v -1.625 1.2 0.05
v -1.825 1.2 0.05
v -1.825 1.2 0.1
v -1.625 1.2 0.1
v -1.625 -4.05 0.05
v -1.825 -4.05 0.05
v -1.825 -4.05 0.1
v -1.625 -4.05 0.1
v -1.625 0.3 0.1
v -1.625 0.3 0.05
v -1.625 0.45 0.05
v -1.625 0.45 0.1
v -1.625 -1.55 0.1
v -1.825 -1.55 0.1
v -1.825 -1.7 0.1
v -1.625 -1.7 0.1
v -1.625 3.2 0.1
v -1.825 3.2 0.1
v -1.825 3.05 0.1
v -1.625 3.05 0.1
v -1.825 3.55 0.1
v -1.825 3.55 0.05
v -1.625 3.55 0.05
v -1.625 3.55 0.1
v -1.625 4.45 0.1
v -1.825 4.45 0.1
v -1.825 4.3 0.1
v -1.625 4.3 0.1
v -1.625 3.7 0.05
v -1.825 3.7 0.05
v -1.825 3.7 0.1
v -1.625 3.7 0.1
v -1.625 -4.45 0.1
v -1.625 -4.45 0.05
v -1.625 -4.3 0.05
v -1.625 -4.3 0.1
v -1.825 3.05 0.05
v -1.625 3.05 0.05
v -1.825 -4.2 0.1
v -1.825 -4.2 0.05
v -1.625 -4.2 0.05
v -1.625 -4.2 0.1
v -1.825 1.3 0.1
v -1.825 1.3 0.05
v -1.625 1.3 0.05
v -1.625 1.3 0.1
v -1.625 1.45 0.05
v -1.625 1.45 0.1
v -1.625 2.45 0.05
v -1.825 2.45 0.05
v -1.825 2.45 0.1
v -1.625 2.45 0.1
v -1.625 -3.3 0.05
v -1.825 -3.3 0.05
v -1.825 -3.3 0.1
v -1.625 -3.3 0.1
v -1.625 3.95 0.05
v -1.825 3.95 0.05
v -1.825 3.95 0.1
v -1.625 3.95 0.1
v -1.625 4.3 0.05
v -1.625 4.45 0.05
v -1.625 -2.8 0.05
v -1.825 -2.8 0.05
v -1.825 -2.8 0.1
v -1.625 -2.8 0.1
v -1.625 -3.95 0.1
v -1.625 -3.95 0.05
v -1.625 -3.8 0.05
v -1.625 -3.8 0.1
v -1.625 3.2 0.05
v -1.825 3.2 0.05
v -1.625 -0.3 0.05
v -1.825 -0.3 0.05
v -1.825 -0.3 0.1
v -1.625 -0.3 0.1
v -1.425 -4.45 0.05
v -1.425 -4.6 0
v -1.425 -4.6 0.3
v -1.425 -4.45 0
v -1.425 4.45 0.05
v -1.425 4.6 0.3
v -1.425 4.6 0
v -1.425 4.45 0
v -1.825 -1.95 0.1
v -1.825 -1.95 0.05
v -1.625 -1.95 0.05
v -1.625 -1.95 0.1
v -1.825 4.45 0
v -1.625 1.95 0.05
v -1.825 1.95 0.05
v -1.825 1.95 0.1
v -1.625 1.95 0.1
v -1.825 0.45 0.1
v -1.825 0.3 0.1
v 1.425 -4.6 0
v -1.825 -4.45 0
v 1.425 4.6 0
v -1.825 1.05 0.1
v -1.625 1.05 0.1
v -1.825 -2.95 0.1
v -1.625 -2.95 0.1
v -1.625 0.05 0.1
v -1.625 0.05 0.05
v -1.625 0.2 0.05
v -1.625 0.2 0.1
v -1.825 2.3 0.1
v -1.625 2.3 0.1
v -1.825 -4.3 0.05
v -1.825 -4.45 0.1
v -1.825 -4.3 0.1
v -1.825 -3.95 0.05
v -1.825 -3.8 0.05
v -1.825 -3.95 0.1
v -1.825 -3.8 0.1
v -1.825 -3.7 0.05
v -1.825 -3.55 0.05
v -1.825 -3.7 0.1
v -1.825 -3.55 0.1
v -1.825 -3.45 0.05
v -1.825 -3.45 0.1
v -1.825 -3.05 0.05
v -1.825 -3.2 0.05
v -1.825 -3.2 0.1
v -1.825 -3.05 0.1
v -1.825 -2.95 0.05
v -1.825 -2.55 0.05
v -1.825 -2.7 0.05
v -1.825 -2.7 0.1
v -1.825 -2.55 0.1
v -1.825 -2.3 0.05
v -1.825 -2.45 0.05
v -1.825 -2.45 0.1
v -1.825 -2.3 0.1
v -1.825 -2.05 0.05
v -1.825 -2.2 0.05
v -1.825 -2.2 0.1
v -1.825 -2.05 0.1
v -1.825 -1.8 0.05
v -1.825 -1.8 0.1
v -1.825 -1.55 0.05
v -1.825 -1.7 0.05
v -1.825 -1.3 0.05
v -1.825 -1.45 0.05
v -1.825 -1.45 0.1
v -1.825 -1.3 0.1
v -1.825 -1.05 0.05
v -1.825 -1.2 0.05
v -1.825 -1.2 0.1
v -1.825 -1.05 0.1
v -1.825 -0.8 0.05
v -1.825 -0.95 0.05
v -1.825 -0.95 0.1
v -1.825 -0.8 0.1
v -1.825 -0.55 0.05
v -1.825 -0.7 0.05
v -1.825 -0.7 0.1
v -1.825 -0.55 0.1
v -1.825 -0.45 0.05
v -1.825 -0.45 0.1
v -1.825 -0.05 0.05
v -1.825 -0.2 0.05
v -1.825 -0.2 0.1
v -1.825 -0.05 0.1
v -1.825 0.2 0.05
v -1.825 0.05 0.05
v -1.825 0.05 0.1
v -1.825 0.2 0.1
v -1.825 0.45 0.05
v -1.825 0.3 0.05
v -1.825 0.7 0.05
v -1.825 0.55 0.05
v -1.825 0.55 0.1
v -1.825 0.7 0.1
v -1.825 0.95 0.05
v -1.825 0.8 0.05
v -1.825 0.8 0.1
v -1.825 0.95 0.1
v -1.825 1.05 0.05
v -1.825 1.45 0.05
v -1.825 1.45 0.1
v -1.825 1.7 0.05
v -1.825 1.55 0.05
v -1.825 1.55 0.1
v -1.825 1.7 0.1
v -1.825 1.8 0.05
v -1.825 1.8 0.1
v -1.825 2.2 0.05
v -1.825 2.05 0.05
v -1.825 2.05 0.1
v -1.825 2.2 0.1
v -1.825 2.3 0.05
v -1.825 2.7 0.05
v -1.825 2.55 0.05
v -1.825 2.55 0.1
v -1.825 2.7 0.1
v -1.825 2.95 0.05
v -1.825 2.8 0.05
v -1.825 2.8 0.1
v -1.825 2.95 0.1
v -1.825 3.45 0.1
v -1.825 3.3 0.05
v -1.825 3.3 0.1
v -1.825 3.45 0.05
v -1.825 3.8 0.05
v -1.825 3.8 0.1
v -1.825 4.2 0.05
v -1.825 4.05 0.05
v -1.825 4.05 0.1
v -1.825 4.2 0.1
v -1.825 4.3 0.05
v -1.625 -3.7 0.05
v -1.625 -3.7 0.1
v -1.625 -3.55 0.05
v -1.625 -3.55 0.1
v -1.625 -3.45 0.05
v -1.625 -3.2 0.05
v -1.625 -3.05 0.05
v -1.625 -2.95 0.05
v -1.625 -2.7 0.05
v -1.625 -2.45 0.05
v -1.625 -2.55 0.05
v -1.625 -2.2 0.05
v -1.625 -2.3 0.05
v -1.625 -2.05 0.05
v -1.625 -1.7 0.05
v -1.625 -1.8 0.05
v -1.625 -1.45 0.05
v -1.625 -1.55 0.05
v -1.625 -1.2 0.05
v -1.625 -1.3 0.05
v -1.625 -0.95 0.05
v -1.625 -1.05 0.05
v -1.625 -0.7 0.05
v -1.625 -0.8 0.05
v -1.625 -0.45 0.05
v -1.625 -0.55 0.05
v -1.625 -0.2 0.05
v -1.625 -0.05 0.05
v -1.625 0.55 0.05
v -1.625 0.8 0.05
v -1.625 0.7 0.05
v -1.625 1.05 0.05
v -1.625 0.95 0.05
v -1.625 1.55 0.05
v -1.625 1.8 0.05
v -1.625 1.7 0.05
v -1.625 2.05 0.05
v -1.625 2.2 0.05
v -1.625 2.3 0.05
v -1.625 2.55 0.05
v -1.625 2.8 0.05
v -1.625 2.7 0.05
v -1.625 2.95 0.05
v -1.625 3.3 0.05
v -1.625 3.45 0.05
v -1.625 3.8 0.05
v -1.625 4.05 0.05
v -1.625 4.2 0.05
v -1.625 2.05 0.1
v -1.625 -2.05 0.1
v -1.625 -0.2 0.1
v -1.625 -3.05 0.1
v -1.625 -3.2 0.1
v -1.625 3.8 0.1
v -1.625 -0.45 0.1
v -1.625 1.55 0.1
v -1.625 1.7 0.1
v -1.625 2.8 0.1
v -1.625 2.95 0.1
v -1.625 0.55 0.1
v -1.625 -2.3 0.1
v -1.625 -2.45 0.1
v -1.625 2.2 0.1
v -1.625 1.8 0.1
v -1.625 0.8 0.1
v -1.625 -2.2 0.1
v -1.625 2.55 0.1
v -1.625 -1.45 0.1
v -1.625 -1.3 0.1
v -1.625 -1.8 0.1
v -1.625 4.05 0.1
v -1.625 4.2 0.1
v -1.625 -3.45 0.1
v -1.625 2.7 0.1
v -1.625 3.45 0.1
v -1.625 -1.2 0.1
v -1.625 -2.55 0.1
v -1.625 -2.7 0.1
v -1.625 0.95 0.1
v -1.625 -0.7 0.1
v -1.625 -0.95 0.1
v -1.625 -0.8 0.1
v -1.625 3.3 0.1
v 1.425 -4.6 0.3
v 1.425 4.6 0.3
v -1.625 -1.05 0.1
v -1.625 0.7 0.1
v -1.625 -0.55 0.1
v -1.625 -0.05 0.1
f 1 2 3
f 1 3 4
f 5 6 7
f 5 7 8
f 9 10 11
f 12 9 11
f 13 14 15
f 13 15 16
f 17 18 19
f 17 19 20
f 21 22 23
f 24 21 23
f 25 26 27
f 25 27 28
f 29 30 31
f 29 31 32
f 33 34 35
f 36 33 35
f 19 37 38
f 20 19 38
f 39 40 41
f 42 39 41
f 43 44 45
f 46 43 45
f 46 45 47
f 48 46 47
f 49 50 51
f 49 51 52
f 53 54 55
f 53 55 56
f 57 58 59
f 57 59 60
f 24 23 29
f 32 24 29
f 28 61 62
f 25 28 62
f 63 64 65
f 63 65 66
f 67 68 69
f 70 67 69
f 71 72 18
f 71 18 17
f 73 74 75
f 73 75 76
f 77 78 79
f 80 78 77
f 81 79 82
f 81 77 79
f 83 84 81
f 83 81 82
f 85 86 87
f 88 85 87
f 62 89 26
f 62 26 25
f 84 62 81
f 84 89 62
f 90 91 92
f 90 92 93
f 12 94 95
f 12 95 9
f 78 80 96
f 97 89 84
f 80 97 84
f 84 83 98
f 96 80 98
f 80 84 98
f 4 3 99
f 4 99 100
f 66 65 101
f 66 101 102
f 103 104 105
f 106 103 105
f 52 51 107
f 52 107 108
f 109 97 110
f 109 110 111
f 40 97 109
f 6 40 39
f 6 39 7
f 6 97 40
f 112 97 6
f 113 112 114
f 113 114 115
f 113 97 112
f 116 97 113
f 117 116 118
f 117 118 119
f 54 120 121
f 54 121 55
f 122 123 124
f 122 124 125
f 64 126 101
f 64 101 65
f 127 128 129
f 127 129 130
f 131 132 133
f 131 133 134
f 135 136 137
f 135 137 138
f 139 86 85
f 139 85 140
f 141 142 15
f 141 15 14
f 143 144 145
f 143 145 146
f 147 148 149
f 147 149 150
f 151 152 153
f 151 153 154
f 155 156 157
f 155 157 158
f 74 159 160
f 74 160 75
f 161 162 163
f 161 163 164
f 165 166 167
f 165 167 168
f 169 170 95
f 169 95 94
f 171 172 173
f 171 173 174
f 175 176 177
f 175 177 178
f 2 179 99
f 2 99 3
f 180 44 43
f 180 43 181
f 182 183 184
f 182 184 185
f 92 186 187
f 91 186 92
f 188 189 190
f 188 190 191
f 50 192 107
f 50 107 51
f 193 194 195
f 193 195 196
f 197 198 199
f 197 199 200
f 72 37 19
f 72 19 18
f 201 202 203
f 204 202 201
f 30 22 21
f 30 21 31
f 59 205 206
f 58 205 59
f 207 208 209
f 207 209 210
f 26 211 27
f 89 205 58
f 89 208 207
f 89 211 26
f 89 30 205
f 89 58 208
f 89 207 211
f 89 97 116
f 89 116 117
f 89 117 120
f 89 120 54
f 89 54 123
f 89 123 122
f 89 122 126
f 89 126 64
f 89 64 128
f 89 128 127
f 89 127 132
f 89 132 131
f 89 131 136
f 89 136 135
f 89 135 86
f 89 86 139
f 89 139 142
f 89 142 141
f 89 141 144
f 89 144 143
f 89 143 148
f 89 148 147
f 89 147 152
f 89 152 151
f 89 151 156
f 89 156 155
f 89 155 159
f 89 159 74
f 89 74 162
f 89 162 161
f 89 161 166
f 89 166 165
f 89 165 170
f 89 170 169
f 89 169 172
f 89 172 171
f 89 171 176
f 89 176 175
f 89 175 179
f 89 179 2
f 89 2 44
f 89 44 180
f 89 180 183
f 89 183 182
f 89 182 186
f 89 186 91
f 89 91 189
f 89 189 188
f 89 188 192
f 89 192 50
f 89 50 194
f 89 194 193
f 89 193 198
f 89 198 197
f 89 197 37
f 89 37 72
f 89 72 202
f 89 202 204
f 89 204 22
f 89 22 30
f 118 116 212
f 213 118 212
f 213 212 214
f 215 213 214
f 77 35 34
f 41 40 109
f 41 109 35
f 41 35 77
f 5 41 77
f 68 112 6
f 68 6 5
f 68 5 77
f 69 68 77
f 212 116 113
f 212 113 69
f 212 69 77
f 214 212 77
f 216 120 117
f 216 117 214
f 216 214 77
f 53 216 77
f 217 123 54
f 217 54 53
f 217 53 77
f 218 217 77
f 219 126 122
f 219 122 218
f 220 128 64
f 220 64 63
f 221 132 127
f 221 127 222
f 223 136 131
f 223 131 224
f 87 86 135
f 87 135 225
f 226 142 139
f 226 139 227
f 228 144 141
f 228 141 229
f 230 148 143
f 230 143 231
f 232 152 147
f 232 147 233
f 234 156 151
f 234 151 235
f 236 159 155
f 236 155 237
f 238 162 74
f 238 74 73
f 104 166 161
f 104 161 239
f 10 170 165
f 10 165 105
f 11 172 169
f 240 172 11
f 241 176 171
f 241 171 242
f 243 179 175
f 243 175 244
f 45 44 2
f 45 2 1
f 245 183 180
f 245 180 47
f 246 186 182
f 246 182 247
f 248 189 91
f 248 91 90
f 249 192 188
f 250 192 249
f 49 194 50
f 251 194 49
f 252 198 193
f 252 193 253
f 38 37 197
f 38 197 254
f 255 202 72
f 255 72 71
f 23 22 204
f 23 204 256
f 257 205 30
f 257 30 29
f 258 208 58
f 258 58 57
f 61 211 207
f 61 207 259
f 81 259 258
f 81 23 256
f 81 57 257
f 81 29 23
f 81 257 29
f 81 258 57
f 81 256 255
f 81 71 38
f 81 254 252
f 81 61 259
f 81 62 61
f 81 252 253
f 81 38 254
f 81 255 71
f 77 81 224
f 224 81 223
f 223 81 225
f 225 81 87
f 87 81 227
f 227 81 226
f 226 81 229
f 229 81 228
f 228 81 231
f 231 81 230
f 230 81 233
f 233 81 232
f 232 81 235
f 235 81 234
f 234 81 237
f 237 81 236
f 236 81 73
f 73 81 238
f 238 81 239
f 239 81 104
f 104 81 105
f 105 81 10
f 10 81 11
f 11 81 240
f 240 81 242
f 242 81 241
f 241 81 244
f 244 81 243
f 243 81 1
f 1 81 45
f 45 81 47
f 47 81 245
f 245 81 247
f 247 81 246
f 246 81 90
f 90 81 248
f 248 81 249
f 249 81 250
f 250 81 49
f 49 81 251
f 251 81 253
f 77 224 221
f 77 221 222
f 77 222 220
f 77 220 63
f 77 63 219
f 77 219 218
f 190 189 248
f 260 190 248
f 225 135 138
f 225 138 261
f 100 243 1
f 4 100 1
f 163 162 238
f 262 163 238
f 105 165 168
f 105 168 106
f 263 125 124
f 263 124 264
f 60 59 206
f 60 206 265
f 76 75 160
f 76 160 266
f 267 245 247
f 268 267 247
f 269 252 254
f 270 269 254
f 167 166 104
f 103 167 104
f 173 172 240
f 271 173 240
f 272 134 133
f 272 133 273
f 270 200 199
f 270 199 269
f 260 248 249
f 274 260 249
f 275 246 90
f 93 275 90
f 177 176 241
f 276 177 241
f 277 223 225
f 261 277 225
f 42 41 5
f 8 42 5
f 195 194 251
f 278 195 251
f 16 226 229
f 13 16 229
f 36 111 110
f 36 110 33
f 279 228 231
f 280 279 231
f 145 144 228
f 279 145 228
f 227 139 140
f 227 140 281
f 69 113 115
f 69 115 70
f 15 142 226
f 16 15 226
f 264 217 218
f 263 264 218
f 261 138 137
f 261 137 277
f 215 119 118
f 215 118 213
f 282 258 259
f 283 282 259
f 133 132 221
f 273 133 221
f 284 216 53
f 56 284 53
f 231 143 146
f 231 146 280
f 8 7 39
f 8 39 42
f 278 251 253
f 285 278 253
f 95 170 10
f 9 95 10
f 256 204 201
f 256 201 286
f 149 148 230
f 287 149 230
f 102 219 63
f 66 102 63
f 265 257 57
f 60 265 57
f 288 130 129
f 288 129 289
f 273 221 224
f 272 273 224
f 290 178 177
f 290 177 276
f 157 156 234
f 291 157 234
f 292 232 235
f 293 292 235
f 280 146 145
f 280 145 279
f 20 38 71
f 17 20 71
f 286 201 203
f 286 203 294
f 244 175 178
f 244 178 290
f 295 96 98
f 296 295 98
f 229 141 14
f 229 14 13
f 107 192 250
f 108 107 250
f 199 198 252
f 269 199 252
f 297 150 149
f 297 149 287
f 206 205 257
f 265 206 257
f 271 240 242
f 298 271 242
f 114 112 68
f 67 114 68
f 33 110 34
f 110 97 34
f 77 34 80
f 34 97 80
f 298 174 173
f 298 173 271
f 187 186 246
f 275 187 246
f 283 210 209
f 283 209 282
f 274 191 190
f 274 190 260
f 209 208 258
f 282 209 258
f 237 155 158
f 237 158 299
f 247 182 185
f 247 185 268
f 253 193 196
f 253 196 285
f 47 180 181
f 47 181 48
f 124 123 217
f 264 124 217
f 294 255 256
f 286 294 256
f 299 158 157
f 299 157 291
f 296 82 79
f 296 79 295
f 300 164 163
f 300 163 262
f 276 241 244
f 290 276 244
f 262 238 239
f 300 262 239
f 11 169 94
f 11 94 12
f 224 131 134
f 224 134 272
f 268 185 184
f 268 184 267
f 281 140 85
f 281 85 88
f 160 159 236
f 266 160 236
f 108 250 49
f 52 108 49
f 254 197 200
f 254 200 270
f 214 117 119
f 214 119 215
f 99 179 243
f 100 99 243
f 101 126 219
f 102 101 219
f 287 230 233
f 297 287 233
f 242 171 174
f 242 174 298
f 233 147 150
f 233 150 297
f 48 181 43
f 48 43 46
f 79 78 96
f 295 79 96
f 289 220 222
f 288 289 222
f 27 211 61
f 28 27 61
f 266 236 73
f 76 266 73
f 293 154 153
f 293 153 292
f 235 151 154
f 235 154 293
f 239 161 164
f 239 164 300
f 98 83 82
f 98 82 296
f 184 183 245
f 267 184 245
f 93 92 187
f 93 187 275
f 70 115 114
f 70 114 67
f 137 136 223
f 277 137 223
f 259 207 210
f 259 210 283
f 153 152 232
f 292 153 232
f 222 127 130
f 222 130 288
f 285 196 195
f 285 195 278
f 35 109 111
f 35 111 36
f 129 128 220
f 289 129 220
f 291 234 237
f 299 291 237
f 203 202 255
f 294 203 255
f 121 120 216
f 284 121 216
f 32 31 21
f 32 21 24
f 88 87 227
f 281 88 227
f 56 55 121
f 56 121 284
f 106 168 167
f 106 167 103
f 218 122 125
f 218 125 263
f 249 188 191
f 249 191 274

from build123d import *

# Parameters (mm, degrees)
SKETCH1_W       = 2.85
SKETCH1_H       = 9.2
EXTRUDE1_DEPTH  = 0.3
SKETCH2_W       = 0.4
SKETCH2_H       = 8.9
EXTRUDE2_DEPTH  = 0.05
SKETCH3_W       = 0.2
SKETCH3_H       = 8.9
EXTRUDE3_DEPTH  = 0.05
SKETCH4_W       = 0.2
SKETCH4_H       = 0.1
EXTRUDE4_DEPTH  = 1.25
LPATTERN1_COUNT = 35
LPATTERN1_PITCH = 0.25


with BuildPart() as part:
    # Sketch1 → Extrude1 (new body)
    with BuildSketch(Plane.XY):
        Rectangle(SKETCH1_W, SKETCH1_H)
    extrude(amount=EXTRUDE1_DEPTH)

    # Sketch2 → Extrude2 (add)
    with BuildSketch(Plane.XY):
        with Locations((-1.625, 0)):
            Rectangle(SKETCH2_W, SKETCH2_H)
    extrude(amount=EXTRUDE2_DEPTH)

    # Sketch3 → Extrude3 (add)
    with BuildSketch(Plane.XY.offset(0.05)):
        with Locations((-1.725, 0)):
            Rectangle(SKETCH3_W, SKETCH3_H)
    extrude(amount=EXTRUDE3_DEPTH)

    # Sketch4 → Extrude4 (cut, through all)
    with BuildSketch(Plane.XY.offset(0.05)):
        with Locations((-1.725, -4.25)):
            Rectangle(SKETCH4_W, SKETCH4_H)
    extrude4 = extrude(amount=EXTRUDE4_DEPTH, mode=Mode.SUBTRACT)

    # LPattern1: Extrude4 ×35
    with Locations(*[(0, i * LPATTERN1_PITCH, 0) for i in range(1, LPATTERN1_COUNT)]):
        add(extrude4, mode=Mode.SUBTRACT)


solid = part.part
